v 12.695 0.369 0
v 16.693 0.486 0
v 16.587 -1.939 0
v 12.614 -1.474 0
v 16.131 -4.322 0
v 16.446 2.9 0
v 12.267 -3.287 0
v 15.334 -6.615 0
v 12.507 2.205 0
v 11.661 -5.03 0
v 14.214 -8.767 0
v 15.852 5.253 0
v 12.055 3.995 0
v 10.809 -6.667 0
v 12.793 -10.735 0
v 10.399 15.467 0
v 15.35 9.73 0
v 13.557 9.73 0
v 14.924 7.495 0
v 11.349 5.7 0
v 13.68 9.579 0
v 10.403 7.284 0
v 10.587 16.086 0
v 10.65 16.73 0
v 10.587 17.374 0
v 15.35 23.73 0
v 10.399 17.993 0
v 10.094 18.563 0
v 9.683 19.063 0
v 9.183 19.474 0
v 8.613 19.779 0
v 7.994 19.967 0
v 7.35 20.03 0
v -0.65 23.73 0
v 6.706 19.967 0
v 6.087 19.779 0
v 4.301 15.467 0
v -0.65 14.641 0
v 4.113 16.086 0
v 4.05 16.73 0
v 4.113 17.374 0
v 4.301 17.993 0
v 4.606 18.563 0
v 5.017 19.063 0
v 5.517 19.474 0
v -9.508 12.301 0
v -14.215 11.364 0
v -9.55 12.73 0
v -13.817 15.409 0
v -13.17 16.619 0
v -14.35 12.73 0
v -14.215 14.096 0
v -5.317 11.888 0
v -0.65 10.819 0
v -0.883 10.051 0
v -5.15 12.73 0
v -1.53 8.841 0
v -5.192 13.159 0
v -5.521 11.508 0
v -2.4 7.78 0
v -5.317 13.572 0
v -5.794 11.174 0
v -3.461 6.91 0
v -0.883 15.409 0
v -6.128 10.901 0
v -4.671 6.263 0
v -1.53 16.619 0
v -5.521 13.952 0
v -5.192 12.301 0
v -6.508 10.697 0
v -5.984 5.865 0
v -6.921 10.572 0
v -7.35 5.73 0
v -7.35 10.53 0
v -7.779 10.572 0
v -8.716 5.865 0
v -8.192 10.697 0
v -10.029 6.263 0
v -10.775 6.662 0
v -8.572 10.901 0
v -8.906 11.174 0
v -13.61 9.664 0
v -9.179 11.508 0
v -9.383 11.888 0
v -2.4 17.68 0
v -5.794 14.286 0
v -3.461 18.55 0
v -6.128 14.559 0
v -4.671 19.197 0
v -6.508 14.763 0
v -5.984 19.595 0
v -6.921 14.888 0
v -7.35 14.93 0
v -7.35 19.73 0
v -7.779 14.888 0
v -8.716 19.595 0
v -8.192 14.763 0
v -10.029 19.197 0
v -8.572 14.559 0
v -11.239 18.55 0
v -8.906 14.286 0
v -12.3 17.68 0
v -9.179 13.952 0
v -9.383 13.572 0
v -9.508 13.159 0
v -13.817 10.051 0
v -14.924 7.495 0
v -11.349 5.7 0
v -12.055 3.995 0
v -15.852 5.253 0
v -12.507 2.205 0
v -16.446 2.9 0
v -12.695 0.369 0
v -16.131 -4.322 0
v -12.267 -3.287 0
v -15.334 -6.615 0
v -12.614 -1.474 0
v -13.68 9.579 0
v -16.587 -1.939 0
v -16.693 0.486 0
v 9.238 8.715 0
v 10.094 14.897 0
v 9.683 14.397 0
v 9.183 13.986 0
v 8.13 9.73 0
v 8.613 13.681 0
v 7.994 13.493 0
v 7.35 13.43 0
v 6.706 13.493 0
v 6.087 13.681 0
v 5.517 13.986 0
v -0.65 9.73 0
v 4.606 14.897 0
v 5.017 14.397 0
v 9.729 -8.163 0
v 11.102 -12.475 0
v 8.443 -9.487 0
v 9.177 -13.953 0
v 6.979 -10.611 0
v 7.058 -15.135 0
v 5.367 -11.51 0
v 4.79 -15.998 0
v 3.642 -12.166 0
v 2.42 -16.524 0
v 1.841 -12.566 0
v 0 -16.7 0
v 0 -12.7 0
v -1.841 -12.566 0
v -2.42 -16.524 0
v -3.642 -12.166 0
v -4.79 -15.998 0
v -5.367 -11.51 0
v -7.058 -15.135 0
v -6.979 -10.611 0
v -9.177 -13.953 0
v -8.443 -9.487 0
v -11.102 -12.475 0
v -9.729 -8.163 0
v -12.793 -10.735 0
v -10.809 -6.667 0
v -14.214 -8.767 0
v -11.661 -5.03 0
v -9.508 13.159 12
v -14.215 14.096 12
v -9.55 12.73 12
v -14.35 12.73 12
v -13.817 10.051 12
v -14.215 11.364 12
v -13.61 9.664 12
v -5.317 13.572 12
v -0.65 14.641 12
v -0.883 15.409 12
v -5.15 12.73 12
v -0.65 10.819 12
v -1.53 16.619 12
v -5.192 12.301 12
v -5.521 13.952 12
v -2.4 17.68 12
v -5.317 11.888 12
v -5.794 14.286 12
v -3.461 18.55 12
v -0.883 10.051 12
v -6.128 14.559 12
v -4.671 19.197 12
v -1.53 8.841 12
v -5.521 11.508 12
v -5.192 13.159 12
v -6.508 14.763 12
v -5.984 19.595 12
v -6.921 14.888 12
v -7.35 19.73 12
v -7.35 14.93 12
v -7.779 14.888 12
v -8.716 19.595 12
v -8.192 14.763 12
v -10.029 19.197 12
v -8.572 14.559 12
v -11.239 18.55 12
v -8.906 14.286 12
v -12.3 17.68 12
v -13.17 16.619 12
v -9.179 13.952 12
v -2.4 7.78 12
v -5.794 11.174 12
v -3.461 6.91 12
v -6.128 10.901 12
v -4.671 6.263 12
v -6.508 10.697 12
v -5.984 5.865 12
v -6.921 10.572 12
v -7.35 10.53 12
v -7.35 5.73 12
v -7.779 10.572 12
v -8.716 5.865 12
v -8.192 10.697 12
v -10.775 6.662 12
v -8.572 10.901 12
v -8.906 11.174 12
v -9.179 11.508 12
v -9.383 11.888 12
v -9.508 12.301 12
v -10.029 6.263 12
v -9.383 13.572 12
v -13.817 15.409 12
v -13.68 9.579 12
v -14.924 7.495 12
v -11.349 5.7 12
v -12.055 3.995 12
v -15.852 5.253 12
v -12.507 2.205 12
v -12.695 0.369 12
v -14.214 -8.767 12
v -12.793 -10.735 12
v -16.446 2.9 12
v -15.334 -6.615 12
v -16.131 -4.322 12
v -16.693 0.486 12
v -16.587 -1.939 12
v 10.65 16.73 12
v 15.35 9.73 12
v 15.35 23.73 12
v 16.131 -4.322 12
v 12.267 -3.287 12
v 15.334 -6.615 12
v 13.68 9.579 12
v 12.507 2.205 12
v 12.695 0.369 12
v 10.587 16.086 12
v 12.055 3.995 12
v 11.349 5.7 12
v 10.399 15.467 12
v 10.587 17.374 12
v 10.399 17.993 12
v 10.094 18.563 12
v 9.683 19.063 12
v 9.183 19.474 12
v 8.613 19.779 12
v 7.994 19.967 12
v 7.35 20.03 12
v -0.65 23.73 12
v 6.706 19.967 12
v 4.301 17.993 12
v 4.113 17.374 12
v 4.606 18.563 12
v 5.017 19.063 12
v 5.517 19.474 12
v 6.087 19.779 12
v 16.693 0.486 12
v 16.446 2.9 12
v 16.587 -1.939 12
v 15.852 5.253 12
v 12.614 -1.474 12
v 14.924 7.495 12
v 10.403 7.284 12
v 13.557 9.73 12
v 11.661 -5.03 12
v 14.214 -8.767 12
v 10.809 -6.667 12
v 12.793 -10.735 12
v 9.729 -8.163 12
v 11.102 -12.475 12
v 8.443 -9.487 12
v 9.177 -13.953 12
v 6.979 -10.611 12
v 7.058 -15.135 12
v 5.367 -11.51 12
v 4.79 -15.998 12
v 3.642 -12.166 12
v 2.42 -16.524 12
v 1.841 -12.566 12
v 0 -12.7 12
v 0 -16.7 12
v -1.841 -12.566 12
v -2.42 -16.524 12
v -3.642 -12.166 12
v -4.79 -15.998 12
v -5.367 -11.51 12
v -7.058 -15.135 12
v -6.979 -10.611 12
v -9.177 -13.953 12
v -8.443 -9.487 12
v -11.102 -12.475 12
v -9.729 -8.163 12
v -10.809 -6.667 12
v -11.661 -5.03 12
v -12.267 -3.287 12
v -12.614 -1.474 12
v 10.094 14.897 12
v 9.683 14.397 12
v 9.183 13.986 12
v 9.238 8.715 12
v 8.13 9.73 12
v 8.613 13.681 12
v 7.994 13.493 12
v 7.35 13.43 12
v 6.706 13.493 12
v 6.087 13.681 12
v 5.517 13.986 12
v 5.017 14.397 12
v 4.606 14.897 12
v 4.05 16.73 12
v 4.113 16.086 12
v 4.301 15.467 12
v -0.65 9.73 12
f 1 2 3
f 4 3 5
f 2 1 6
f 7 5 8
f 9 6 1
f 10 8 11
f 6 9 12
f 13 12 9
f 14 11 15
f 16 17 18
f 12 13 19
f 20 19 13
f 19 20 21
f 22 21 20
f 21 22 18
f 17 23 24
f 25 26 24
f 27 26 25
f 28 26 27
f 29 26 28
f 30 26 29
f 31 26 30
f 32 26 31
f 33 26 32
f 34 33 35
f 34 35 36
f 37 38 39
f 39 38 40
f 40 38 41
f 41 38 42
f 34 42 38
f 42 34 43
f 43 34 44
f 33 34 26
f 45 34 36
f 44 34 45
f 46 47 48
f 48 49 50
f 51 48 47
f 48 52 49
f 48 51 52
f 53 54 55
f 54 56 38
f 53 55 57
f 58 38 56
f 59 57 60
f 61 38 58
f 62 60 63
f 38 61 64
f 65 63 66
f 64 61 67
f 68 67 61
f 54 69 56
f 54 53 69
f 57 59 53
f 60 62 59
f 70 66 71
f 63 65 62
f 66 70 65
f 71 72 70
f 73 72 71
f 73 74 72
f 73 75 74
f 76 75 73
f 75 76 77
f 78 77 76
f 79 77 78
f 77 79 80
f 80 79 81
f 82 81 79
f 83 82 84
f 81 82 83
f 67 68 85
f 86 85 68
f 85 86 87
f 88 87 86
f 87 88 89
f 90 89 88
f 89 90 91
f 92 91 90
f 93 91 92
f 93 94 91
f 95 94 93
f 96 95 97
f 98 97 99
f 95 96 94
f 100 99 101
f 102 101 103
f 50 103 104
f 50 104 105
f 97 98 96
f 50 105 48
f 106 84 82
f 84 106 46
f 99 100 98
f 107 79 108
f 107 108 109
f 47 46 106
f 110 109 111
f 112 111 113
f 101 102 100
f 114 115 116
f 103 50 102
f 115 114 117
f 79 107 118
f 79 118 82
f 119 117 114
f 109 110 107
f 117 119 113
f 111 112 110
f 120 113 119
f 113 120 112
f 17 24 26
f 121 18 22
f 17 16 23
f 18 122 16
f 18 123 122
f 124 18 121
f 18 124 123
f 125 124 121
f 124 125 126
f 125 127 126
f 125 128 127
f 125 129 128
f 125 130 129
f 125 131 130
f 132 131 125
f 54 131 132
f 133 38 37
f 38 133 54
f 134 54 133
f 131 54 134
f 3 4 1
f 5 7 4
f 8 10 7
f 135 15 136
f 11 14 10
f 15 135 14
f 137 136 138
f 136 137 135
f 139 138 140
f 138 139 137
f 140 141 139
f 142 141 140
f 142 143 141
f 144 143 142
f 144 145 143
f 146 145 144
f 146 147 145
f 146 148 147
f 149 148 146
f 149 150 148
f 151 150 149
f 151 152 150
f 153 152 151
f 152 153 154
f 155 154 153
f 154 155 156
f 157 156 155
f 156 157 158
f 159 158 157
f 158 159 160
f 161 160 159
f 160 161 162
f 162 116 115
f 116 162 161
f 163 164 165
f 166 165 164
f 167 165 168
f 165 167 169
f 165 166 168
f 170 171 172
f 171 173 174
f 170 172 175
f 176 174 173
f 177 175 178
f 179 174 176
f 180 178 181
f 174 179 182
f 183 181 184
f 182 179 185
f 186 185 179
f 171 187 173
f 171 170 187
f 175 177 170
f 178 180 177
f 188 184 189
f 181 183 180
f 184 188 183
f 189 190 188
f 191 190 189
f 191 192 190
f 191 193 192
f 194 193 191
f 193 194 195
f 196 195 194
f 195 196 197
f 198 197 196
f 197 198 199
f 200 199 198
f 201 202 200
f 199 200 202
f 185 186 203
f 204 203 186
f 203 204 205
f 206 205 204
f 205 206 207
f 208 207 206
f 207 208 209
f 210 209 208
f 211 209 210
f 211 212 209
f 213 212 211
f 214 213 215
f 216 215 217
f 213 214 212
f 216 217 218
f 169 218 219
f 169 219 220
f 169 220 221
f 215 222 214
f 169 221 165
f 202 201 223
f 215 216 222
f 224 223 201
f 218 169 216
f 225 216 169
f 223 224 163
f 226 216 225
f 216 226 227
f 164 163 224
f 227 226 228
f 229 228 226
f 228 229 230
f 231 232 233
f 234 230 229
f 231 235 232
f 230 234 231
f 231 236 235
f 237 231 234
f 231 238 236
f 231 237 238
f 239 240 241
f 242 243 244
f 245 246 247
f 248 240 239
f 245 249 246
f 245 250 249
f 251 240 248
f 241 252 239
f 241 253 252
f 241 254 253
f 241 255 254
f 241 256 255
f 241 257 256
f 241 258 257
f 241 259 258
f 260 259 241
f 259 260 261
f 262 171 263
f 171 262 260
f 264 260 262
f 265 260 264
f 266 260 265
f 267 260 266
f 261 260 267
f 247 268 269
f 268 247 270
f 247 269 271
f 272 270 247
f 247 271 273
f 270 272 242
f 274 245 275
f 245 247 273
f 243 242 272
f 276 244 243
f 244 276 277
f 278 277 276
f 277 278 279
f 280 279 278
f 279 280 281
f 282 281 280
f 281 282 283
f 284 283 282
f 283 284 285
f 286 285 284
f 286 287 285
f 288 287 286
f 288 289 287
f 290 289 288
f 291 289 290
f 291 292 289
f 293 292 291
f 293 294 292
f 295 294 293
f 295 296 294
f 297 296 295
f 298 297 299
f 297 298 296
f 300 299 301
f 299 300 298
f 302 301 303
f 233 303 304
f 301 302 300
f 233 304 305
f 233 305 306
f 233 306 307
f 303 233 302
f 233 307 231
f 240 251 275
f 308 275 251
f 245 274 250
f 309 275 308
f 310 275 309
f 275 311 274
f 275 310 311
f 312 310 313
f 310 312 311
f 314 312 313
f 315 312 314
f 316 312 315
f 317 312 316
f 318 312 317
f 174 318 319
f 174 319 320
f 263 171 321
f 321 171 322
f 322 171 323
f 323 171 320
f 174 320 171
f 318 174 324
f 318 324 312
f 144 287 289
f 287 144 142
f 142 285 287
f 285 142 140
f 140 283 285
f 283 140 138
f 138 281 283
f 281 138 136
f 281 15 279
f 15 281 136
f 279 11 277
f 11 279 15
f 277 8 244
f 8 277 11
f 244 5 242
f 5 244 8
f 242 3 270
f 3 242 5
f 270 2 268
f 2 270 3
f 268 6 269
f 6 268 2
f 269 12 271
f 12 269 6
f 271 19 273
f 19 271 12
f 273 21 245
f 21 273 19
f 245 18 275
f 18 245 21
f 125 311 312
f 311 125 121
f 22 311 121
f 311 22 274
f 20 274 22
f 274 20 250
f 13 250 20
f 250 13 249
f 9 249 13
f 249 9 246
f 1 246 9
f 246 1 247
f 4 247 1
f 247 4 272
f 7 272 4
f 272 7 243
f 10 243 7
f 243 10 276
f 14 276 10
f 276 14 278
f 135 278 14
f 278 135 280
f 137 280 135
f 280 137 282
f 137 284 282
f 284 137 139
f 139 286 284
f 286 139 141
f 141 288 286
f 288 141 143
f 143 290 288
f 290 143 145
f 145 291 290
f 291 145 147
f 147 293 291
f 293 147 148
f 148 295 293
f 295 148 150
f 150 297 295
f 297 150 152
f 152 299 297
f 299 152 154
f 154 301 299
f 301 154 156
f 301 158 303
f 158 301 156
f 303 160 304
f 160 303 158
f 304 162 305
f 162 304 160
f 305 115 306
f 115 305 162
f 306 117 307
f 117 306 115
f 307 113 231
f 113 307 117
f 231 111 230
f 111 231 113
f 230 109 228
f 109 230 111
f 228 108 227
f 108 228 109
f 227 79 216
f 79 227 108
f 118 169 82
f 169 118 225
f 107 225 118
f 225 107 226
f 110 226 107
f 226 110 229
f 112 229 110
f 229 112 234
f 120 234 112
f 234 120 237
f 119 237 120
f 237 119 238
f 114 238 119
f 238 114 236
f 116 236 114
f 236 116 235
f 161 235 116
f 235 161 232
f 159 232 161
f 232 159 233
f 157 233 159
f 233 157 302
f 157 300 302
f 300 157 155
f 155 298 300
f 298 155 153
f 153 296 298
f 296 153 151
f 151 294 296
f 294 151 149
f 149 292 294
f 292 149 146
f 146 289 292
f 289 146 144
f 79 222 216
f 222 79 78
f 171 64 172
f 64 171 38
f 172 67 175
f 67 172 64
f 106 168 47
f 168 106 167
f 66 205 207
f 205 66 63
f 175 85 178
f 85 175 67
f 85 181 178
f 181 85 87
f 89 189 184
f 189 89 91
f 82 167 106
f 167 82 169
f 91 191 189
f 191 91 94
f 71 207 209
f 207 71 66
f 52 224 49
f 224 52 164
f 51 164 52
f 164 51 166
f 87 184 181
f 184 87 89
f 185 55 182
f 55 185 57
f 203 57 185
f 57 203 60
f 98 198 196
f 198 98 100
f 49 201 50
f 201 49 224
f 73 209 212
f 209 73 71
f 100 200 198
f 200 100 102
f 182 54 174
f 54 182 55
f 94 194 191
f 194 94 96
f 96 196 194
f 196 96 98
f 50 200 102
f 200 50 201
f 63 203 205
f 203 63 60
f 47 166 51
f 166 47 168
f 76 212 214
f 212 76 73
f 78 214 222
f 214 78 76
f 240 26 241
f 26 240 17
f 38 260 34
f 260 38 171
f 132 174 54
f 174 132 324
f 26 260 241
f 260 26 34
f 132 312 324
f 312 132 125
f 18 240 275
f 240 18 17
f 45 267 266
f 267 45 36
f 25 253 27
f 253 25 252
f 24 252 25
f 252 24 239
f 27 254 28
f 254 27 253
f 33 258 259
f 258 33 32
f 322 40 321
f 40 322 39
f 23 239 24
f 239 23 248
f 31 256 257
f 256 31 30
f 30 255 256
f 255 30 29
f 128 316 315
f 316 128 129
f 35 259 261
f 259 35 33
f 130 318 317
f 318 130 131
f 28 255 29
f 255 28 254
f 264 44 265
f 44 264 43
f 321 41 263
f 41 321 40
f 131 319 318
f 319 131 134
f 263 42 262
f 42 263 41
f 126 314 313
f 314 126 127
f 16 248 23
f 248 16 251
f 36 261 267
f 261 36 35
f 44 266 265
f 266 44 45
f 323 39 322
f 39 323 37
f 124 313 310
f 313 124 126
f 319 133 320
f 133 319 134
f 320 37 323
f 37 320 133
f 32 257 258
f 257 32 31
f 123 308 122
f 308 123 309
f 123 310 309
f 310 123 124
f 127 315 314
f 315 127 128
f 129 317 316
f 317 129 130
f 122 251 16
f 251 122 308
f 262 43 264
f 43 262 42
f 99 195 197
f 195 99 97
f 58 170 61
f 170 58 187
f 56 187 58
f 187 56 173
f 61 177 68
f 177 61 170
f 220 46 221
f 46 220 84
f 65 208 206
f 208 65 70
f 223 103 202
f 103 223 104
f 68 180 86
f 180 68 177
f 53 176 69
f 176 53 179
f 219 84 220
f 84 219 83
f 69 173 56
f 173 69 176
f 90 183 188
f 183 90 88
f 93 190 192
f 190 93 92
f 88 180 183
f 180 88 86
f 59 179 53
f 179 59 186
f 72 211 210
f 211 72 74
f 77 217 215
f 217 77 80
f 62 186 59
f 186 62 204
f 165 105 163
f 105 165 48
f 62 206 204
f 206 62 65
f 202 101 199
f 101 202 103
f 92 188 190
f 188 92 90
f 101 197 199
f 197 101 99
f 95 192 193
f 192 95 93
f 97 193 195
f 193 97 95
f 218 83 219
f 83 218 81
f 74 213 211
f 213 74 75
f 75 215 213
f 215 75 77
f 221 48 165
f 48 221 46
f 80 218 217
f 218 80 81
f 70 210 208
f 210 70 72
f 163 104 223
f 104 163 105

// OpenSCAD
$fn = 32;

// ----------------------------------------------------------------------
// Pipe clamp: 33.4 mm ring, 4 mm wall, 12 mm wide
// ----------------------------------------------------------------------

// --- parameters (mm) ---
outer_r = 16.7;           // clamp outside radius
inner_r = 12.7;           // pipe bore radius
band = 4;                 // band thickness
clamp_w = 12;             // clamp width
opening = 60;             // opening angle between the ends
lug_w = 16;               // lug width
lug_len = 14;             // lug length
bolt_d = 6.6;             // bolt hole
knuckle_d = 14;           // hinge knuckle diameter
pin_d = 4.4;              // hinge pin hole

clamp_profile = [[-8.35, 14.463], [-10.358, 13.1], [-12.147, 11.46], [-13.68, 9.579], [-14.924, 7.495], [-15.852, 5.253], [-16.446, 2.9], [-16.693, 0.486], [-16.587, -1.939], [-16.131, -4.322], [-15.334, -6.615], [-14.214, -8.767], [-12.793, -10.735], [-11.102, -12.475], [-9.177, -13.953], [-7.058, -15.135], [-4.79, -15.998], [-2.42, -16.524], [0, -16.7], [2.42, -16.524], [4.79, -15.998], [7.058, -15.135], [9.177, -13.953], [11.102, -12.475], [12.793, -10.735], [14.214, -8.767], [15.334, -6.615], [16.131, -4.322], [16.587, -1.939], [16.693, 0.486], [16.446, 2.9], [15.852, 5.253], [14.924, 7.495], [13.68, 9.579], [12.147, 11.46], [10.358, 13.1], [8.35, 14.463], [6.35, 10.999], [7.877, 9.962], [9.238, 8.715], [10.403, 7.284], [11.349, 5.7], [12.055, 3.995], [12.507, 2.205], [12.695, 0.369], [12.614, -1.474], [12.267, -3.287], [11.661, -5.03], [10.809, -6.667], [9.729, -8.163], [8.443, -9.487], [6.979, -10.611], [5.367, -11.51], [3.642, -12.166], [1.841, -12.566], [0, -12.7], [-1.841, -12.566], [-3.642, -12.166], [-5.367, -11.51], [-6.979, -10.611], [-8.443, -9.487], [-9.729, -8.163], [-10.809, -6.667], [-11.661, -5.03], [-12.267, -3.287], [-12.614, -1.474], [-12.695, 0.369], [-12.507, 2.205], [-12.055, 3.995], [-11.349, 5.7], [-10.403, 7.284], [-9.238, 8.715], [-7.877, 9.962], [-6.35, 10.999]];

difference() {
  union() {
    linear_extrude(height = clamp_w) polygon(clamp_profile);
    /* hinge knuckle, sunk 2 mm into the band end */
    translate([-7.35, 12.73, 0]) cylinder(h = clamp_w, d = knuckle_d);
    /* bolt lug on the other end */
    translate([-0.65, 9.73, 0]) cube([lug_w, 14, clamp_w]);
  }
  translate([7.35, 16.73, -2.5]) cylinder(h = clamp_w + 5, d = bolt_d);
  translate([-7.35, 12.73, -2.5]) cylinder(h = clamp_w + 5, d = pin_d);
}
